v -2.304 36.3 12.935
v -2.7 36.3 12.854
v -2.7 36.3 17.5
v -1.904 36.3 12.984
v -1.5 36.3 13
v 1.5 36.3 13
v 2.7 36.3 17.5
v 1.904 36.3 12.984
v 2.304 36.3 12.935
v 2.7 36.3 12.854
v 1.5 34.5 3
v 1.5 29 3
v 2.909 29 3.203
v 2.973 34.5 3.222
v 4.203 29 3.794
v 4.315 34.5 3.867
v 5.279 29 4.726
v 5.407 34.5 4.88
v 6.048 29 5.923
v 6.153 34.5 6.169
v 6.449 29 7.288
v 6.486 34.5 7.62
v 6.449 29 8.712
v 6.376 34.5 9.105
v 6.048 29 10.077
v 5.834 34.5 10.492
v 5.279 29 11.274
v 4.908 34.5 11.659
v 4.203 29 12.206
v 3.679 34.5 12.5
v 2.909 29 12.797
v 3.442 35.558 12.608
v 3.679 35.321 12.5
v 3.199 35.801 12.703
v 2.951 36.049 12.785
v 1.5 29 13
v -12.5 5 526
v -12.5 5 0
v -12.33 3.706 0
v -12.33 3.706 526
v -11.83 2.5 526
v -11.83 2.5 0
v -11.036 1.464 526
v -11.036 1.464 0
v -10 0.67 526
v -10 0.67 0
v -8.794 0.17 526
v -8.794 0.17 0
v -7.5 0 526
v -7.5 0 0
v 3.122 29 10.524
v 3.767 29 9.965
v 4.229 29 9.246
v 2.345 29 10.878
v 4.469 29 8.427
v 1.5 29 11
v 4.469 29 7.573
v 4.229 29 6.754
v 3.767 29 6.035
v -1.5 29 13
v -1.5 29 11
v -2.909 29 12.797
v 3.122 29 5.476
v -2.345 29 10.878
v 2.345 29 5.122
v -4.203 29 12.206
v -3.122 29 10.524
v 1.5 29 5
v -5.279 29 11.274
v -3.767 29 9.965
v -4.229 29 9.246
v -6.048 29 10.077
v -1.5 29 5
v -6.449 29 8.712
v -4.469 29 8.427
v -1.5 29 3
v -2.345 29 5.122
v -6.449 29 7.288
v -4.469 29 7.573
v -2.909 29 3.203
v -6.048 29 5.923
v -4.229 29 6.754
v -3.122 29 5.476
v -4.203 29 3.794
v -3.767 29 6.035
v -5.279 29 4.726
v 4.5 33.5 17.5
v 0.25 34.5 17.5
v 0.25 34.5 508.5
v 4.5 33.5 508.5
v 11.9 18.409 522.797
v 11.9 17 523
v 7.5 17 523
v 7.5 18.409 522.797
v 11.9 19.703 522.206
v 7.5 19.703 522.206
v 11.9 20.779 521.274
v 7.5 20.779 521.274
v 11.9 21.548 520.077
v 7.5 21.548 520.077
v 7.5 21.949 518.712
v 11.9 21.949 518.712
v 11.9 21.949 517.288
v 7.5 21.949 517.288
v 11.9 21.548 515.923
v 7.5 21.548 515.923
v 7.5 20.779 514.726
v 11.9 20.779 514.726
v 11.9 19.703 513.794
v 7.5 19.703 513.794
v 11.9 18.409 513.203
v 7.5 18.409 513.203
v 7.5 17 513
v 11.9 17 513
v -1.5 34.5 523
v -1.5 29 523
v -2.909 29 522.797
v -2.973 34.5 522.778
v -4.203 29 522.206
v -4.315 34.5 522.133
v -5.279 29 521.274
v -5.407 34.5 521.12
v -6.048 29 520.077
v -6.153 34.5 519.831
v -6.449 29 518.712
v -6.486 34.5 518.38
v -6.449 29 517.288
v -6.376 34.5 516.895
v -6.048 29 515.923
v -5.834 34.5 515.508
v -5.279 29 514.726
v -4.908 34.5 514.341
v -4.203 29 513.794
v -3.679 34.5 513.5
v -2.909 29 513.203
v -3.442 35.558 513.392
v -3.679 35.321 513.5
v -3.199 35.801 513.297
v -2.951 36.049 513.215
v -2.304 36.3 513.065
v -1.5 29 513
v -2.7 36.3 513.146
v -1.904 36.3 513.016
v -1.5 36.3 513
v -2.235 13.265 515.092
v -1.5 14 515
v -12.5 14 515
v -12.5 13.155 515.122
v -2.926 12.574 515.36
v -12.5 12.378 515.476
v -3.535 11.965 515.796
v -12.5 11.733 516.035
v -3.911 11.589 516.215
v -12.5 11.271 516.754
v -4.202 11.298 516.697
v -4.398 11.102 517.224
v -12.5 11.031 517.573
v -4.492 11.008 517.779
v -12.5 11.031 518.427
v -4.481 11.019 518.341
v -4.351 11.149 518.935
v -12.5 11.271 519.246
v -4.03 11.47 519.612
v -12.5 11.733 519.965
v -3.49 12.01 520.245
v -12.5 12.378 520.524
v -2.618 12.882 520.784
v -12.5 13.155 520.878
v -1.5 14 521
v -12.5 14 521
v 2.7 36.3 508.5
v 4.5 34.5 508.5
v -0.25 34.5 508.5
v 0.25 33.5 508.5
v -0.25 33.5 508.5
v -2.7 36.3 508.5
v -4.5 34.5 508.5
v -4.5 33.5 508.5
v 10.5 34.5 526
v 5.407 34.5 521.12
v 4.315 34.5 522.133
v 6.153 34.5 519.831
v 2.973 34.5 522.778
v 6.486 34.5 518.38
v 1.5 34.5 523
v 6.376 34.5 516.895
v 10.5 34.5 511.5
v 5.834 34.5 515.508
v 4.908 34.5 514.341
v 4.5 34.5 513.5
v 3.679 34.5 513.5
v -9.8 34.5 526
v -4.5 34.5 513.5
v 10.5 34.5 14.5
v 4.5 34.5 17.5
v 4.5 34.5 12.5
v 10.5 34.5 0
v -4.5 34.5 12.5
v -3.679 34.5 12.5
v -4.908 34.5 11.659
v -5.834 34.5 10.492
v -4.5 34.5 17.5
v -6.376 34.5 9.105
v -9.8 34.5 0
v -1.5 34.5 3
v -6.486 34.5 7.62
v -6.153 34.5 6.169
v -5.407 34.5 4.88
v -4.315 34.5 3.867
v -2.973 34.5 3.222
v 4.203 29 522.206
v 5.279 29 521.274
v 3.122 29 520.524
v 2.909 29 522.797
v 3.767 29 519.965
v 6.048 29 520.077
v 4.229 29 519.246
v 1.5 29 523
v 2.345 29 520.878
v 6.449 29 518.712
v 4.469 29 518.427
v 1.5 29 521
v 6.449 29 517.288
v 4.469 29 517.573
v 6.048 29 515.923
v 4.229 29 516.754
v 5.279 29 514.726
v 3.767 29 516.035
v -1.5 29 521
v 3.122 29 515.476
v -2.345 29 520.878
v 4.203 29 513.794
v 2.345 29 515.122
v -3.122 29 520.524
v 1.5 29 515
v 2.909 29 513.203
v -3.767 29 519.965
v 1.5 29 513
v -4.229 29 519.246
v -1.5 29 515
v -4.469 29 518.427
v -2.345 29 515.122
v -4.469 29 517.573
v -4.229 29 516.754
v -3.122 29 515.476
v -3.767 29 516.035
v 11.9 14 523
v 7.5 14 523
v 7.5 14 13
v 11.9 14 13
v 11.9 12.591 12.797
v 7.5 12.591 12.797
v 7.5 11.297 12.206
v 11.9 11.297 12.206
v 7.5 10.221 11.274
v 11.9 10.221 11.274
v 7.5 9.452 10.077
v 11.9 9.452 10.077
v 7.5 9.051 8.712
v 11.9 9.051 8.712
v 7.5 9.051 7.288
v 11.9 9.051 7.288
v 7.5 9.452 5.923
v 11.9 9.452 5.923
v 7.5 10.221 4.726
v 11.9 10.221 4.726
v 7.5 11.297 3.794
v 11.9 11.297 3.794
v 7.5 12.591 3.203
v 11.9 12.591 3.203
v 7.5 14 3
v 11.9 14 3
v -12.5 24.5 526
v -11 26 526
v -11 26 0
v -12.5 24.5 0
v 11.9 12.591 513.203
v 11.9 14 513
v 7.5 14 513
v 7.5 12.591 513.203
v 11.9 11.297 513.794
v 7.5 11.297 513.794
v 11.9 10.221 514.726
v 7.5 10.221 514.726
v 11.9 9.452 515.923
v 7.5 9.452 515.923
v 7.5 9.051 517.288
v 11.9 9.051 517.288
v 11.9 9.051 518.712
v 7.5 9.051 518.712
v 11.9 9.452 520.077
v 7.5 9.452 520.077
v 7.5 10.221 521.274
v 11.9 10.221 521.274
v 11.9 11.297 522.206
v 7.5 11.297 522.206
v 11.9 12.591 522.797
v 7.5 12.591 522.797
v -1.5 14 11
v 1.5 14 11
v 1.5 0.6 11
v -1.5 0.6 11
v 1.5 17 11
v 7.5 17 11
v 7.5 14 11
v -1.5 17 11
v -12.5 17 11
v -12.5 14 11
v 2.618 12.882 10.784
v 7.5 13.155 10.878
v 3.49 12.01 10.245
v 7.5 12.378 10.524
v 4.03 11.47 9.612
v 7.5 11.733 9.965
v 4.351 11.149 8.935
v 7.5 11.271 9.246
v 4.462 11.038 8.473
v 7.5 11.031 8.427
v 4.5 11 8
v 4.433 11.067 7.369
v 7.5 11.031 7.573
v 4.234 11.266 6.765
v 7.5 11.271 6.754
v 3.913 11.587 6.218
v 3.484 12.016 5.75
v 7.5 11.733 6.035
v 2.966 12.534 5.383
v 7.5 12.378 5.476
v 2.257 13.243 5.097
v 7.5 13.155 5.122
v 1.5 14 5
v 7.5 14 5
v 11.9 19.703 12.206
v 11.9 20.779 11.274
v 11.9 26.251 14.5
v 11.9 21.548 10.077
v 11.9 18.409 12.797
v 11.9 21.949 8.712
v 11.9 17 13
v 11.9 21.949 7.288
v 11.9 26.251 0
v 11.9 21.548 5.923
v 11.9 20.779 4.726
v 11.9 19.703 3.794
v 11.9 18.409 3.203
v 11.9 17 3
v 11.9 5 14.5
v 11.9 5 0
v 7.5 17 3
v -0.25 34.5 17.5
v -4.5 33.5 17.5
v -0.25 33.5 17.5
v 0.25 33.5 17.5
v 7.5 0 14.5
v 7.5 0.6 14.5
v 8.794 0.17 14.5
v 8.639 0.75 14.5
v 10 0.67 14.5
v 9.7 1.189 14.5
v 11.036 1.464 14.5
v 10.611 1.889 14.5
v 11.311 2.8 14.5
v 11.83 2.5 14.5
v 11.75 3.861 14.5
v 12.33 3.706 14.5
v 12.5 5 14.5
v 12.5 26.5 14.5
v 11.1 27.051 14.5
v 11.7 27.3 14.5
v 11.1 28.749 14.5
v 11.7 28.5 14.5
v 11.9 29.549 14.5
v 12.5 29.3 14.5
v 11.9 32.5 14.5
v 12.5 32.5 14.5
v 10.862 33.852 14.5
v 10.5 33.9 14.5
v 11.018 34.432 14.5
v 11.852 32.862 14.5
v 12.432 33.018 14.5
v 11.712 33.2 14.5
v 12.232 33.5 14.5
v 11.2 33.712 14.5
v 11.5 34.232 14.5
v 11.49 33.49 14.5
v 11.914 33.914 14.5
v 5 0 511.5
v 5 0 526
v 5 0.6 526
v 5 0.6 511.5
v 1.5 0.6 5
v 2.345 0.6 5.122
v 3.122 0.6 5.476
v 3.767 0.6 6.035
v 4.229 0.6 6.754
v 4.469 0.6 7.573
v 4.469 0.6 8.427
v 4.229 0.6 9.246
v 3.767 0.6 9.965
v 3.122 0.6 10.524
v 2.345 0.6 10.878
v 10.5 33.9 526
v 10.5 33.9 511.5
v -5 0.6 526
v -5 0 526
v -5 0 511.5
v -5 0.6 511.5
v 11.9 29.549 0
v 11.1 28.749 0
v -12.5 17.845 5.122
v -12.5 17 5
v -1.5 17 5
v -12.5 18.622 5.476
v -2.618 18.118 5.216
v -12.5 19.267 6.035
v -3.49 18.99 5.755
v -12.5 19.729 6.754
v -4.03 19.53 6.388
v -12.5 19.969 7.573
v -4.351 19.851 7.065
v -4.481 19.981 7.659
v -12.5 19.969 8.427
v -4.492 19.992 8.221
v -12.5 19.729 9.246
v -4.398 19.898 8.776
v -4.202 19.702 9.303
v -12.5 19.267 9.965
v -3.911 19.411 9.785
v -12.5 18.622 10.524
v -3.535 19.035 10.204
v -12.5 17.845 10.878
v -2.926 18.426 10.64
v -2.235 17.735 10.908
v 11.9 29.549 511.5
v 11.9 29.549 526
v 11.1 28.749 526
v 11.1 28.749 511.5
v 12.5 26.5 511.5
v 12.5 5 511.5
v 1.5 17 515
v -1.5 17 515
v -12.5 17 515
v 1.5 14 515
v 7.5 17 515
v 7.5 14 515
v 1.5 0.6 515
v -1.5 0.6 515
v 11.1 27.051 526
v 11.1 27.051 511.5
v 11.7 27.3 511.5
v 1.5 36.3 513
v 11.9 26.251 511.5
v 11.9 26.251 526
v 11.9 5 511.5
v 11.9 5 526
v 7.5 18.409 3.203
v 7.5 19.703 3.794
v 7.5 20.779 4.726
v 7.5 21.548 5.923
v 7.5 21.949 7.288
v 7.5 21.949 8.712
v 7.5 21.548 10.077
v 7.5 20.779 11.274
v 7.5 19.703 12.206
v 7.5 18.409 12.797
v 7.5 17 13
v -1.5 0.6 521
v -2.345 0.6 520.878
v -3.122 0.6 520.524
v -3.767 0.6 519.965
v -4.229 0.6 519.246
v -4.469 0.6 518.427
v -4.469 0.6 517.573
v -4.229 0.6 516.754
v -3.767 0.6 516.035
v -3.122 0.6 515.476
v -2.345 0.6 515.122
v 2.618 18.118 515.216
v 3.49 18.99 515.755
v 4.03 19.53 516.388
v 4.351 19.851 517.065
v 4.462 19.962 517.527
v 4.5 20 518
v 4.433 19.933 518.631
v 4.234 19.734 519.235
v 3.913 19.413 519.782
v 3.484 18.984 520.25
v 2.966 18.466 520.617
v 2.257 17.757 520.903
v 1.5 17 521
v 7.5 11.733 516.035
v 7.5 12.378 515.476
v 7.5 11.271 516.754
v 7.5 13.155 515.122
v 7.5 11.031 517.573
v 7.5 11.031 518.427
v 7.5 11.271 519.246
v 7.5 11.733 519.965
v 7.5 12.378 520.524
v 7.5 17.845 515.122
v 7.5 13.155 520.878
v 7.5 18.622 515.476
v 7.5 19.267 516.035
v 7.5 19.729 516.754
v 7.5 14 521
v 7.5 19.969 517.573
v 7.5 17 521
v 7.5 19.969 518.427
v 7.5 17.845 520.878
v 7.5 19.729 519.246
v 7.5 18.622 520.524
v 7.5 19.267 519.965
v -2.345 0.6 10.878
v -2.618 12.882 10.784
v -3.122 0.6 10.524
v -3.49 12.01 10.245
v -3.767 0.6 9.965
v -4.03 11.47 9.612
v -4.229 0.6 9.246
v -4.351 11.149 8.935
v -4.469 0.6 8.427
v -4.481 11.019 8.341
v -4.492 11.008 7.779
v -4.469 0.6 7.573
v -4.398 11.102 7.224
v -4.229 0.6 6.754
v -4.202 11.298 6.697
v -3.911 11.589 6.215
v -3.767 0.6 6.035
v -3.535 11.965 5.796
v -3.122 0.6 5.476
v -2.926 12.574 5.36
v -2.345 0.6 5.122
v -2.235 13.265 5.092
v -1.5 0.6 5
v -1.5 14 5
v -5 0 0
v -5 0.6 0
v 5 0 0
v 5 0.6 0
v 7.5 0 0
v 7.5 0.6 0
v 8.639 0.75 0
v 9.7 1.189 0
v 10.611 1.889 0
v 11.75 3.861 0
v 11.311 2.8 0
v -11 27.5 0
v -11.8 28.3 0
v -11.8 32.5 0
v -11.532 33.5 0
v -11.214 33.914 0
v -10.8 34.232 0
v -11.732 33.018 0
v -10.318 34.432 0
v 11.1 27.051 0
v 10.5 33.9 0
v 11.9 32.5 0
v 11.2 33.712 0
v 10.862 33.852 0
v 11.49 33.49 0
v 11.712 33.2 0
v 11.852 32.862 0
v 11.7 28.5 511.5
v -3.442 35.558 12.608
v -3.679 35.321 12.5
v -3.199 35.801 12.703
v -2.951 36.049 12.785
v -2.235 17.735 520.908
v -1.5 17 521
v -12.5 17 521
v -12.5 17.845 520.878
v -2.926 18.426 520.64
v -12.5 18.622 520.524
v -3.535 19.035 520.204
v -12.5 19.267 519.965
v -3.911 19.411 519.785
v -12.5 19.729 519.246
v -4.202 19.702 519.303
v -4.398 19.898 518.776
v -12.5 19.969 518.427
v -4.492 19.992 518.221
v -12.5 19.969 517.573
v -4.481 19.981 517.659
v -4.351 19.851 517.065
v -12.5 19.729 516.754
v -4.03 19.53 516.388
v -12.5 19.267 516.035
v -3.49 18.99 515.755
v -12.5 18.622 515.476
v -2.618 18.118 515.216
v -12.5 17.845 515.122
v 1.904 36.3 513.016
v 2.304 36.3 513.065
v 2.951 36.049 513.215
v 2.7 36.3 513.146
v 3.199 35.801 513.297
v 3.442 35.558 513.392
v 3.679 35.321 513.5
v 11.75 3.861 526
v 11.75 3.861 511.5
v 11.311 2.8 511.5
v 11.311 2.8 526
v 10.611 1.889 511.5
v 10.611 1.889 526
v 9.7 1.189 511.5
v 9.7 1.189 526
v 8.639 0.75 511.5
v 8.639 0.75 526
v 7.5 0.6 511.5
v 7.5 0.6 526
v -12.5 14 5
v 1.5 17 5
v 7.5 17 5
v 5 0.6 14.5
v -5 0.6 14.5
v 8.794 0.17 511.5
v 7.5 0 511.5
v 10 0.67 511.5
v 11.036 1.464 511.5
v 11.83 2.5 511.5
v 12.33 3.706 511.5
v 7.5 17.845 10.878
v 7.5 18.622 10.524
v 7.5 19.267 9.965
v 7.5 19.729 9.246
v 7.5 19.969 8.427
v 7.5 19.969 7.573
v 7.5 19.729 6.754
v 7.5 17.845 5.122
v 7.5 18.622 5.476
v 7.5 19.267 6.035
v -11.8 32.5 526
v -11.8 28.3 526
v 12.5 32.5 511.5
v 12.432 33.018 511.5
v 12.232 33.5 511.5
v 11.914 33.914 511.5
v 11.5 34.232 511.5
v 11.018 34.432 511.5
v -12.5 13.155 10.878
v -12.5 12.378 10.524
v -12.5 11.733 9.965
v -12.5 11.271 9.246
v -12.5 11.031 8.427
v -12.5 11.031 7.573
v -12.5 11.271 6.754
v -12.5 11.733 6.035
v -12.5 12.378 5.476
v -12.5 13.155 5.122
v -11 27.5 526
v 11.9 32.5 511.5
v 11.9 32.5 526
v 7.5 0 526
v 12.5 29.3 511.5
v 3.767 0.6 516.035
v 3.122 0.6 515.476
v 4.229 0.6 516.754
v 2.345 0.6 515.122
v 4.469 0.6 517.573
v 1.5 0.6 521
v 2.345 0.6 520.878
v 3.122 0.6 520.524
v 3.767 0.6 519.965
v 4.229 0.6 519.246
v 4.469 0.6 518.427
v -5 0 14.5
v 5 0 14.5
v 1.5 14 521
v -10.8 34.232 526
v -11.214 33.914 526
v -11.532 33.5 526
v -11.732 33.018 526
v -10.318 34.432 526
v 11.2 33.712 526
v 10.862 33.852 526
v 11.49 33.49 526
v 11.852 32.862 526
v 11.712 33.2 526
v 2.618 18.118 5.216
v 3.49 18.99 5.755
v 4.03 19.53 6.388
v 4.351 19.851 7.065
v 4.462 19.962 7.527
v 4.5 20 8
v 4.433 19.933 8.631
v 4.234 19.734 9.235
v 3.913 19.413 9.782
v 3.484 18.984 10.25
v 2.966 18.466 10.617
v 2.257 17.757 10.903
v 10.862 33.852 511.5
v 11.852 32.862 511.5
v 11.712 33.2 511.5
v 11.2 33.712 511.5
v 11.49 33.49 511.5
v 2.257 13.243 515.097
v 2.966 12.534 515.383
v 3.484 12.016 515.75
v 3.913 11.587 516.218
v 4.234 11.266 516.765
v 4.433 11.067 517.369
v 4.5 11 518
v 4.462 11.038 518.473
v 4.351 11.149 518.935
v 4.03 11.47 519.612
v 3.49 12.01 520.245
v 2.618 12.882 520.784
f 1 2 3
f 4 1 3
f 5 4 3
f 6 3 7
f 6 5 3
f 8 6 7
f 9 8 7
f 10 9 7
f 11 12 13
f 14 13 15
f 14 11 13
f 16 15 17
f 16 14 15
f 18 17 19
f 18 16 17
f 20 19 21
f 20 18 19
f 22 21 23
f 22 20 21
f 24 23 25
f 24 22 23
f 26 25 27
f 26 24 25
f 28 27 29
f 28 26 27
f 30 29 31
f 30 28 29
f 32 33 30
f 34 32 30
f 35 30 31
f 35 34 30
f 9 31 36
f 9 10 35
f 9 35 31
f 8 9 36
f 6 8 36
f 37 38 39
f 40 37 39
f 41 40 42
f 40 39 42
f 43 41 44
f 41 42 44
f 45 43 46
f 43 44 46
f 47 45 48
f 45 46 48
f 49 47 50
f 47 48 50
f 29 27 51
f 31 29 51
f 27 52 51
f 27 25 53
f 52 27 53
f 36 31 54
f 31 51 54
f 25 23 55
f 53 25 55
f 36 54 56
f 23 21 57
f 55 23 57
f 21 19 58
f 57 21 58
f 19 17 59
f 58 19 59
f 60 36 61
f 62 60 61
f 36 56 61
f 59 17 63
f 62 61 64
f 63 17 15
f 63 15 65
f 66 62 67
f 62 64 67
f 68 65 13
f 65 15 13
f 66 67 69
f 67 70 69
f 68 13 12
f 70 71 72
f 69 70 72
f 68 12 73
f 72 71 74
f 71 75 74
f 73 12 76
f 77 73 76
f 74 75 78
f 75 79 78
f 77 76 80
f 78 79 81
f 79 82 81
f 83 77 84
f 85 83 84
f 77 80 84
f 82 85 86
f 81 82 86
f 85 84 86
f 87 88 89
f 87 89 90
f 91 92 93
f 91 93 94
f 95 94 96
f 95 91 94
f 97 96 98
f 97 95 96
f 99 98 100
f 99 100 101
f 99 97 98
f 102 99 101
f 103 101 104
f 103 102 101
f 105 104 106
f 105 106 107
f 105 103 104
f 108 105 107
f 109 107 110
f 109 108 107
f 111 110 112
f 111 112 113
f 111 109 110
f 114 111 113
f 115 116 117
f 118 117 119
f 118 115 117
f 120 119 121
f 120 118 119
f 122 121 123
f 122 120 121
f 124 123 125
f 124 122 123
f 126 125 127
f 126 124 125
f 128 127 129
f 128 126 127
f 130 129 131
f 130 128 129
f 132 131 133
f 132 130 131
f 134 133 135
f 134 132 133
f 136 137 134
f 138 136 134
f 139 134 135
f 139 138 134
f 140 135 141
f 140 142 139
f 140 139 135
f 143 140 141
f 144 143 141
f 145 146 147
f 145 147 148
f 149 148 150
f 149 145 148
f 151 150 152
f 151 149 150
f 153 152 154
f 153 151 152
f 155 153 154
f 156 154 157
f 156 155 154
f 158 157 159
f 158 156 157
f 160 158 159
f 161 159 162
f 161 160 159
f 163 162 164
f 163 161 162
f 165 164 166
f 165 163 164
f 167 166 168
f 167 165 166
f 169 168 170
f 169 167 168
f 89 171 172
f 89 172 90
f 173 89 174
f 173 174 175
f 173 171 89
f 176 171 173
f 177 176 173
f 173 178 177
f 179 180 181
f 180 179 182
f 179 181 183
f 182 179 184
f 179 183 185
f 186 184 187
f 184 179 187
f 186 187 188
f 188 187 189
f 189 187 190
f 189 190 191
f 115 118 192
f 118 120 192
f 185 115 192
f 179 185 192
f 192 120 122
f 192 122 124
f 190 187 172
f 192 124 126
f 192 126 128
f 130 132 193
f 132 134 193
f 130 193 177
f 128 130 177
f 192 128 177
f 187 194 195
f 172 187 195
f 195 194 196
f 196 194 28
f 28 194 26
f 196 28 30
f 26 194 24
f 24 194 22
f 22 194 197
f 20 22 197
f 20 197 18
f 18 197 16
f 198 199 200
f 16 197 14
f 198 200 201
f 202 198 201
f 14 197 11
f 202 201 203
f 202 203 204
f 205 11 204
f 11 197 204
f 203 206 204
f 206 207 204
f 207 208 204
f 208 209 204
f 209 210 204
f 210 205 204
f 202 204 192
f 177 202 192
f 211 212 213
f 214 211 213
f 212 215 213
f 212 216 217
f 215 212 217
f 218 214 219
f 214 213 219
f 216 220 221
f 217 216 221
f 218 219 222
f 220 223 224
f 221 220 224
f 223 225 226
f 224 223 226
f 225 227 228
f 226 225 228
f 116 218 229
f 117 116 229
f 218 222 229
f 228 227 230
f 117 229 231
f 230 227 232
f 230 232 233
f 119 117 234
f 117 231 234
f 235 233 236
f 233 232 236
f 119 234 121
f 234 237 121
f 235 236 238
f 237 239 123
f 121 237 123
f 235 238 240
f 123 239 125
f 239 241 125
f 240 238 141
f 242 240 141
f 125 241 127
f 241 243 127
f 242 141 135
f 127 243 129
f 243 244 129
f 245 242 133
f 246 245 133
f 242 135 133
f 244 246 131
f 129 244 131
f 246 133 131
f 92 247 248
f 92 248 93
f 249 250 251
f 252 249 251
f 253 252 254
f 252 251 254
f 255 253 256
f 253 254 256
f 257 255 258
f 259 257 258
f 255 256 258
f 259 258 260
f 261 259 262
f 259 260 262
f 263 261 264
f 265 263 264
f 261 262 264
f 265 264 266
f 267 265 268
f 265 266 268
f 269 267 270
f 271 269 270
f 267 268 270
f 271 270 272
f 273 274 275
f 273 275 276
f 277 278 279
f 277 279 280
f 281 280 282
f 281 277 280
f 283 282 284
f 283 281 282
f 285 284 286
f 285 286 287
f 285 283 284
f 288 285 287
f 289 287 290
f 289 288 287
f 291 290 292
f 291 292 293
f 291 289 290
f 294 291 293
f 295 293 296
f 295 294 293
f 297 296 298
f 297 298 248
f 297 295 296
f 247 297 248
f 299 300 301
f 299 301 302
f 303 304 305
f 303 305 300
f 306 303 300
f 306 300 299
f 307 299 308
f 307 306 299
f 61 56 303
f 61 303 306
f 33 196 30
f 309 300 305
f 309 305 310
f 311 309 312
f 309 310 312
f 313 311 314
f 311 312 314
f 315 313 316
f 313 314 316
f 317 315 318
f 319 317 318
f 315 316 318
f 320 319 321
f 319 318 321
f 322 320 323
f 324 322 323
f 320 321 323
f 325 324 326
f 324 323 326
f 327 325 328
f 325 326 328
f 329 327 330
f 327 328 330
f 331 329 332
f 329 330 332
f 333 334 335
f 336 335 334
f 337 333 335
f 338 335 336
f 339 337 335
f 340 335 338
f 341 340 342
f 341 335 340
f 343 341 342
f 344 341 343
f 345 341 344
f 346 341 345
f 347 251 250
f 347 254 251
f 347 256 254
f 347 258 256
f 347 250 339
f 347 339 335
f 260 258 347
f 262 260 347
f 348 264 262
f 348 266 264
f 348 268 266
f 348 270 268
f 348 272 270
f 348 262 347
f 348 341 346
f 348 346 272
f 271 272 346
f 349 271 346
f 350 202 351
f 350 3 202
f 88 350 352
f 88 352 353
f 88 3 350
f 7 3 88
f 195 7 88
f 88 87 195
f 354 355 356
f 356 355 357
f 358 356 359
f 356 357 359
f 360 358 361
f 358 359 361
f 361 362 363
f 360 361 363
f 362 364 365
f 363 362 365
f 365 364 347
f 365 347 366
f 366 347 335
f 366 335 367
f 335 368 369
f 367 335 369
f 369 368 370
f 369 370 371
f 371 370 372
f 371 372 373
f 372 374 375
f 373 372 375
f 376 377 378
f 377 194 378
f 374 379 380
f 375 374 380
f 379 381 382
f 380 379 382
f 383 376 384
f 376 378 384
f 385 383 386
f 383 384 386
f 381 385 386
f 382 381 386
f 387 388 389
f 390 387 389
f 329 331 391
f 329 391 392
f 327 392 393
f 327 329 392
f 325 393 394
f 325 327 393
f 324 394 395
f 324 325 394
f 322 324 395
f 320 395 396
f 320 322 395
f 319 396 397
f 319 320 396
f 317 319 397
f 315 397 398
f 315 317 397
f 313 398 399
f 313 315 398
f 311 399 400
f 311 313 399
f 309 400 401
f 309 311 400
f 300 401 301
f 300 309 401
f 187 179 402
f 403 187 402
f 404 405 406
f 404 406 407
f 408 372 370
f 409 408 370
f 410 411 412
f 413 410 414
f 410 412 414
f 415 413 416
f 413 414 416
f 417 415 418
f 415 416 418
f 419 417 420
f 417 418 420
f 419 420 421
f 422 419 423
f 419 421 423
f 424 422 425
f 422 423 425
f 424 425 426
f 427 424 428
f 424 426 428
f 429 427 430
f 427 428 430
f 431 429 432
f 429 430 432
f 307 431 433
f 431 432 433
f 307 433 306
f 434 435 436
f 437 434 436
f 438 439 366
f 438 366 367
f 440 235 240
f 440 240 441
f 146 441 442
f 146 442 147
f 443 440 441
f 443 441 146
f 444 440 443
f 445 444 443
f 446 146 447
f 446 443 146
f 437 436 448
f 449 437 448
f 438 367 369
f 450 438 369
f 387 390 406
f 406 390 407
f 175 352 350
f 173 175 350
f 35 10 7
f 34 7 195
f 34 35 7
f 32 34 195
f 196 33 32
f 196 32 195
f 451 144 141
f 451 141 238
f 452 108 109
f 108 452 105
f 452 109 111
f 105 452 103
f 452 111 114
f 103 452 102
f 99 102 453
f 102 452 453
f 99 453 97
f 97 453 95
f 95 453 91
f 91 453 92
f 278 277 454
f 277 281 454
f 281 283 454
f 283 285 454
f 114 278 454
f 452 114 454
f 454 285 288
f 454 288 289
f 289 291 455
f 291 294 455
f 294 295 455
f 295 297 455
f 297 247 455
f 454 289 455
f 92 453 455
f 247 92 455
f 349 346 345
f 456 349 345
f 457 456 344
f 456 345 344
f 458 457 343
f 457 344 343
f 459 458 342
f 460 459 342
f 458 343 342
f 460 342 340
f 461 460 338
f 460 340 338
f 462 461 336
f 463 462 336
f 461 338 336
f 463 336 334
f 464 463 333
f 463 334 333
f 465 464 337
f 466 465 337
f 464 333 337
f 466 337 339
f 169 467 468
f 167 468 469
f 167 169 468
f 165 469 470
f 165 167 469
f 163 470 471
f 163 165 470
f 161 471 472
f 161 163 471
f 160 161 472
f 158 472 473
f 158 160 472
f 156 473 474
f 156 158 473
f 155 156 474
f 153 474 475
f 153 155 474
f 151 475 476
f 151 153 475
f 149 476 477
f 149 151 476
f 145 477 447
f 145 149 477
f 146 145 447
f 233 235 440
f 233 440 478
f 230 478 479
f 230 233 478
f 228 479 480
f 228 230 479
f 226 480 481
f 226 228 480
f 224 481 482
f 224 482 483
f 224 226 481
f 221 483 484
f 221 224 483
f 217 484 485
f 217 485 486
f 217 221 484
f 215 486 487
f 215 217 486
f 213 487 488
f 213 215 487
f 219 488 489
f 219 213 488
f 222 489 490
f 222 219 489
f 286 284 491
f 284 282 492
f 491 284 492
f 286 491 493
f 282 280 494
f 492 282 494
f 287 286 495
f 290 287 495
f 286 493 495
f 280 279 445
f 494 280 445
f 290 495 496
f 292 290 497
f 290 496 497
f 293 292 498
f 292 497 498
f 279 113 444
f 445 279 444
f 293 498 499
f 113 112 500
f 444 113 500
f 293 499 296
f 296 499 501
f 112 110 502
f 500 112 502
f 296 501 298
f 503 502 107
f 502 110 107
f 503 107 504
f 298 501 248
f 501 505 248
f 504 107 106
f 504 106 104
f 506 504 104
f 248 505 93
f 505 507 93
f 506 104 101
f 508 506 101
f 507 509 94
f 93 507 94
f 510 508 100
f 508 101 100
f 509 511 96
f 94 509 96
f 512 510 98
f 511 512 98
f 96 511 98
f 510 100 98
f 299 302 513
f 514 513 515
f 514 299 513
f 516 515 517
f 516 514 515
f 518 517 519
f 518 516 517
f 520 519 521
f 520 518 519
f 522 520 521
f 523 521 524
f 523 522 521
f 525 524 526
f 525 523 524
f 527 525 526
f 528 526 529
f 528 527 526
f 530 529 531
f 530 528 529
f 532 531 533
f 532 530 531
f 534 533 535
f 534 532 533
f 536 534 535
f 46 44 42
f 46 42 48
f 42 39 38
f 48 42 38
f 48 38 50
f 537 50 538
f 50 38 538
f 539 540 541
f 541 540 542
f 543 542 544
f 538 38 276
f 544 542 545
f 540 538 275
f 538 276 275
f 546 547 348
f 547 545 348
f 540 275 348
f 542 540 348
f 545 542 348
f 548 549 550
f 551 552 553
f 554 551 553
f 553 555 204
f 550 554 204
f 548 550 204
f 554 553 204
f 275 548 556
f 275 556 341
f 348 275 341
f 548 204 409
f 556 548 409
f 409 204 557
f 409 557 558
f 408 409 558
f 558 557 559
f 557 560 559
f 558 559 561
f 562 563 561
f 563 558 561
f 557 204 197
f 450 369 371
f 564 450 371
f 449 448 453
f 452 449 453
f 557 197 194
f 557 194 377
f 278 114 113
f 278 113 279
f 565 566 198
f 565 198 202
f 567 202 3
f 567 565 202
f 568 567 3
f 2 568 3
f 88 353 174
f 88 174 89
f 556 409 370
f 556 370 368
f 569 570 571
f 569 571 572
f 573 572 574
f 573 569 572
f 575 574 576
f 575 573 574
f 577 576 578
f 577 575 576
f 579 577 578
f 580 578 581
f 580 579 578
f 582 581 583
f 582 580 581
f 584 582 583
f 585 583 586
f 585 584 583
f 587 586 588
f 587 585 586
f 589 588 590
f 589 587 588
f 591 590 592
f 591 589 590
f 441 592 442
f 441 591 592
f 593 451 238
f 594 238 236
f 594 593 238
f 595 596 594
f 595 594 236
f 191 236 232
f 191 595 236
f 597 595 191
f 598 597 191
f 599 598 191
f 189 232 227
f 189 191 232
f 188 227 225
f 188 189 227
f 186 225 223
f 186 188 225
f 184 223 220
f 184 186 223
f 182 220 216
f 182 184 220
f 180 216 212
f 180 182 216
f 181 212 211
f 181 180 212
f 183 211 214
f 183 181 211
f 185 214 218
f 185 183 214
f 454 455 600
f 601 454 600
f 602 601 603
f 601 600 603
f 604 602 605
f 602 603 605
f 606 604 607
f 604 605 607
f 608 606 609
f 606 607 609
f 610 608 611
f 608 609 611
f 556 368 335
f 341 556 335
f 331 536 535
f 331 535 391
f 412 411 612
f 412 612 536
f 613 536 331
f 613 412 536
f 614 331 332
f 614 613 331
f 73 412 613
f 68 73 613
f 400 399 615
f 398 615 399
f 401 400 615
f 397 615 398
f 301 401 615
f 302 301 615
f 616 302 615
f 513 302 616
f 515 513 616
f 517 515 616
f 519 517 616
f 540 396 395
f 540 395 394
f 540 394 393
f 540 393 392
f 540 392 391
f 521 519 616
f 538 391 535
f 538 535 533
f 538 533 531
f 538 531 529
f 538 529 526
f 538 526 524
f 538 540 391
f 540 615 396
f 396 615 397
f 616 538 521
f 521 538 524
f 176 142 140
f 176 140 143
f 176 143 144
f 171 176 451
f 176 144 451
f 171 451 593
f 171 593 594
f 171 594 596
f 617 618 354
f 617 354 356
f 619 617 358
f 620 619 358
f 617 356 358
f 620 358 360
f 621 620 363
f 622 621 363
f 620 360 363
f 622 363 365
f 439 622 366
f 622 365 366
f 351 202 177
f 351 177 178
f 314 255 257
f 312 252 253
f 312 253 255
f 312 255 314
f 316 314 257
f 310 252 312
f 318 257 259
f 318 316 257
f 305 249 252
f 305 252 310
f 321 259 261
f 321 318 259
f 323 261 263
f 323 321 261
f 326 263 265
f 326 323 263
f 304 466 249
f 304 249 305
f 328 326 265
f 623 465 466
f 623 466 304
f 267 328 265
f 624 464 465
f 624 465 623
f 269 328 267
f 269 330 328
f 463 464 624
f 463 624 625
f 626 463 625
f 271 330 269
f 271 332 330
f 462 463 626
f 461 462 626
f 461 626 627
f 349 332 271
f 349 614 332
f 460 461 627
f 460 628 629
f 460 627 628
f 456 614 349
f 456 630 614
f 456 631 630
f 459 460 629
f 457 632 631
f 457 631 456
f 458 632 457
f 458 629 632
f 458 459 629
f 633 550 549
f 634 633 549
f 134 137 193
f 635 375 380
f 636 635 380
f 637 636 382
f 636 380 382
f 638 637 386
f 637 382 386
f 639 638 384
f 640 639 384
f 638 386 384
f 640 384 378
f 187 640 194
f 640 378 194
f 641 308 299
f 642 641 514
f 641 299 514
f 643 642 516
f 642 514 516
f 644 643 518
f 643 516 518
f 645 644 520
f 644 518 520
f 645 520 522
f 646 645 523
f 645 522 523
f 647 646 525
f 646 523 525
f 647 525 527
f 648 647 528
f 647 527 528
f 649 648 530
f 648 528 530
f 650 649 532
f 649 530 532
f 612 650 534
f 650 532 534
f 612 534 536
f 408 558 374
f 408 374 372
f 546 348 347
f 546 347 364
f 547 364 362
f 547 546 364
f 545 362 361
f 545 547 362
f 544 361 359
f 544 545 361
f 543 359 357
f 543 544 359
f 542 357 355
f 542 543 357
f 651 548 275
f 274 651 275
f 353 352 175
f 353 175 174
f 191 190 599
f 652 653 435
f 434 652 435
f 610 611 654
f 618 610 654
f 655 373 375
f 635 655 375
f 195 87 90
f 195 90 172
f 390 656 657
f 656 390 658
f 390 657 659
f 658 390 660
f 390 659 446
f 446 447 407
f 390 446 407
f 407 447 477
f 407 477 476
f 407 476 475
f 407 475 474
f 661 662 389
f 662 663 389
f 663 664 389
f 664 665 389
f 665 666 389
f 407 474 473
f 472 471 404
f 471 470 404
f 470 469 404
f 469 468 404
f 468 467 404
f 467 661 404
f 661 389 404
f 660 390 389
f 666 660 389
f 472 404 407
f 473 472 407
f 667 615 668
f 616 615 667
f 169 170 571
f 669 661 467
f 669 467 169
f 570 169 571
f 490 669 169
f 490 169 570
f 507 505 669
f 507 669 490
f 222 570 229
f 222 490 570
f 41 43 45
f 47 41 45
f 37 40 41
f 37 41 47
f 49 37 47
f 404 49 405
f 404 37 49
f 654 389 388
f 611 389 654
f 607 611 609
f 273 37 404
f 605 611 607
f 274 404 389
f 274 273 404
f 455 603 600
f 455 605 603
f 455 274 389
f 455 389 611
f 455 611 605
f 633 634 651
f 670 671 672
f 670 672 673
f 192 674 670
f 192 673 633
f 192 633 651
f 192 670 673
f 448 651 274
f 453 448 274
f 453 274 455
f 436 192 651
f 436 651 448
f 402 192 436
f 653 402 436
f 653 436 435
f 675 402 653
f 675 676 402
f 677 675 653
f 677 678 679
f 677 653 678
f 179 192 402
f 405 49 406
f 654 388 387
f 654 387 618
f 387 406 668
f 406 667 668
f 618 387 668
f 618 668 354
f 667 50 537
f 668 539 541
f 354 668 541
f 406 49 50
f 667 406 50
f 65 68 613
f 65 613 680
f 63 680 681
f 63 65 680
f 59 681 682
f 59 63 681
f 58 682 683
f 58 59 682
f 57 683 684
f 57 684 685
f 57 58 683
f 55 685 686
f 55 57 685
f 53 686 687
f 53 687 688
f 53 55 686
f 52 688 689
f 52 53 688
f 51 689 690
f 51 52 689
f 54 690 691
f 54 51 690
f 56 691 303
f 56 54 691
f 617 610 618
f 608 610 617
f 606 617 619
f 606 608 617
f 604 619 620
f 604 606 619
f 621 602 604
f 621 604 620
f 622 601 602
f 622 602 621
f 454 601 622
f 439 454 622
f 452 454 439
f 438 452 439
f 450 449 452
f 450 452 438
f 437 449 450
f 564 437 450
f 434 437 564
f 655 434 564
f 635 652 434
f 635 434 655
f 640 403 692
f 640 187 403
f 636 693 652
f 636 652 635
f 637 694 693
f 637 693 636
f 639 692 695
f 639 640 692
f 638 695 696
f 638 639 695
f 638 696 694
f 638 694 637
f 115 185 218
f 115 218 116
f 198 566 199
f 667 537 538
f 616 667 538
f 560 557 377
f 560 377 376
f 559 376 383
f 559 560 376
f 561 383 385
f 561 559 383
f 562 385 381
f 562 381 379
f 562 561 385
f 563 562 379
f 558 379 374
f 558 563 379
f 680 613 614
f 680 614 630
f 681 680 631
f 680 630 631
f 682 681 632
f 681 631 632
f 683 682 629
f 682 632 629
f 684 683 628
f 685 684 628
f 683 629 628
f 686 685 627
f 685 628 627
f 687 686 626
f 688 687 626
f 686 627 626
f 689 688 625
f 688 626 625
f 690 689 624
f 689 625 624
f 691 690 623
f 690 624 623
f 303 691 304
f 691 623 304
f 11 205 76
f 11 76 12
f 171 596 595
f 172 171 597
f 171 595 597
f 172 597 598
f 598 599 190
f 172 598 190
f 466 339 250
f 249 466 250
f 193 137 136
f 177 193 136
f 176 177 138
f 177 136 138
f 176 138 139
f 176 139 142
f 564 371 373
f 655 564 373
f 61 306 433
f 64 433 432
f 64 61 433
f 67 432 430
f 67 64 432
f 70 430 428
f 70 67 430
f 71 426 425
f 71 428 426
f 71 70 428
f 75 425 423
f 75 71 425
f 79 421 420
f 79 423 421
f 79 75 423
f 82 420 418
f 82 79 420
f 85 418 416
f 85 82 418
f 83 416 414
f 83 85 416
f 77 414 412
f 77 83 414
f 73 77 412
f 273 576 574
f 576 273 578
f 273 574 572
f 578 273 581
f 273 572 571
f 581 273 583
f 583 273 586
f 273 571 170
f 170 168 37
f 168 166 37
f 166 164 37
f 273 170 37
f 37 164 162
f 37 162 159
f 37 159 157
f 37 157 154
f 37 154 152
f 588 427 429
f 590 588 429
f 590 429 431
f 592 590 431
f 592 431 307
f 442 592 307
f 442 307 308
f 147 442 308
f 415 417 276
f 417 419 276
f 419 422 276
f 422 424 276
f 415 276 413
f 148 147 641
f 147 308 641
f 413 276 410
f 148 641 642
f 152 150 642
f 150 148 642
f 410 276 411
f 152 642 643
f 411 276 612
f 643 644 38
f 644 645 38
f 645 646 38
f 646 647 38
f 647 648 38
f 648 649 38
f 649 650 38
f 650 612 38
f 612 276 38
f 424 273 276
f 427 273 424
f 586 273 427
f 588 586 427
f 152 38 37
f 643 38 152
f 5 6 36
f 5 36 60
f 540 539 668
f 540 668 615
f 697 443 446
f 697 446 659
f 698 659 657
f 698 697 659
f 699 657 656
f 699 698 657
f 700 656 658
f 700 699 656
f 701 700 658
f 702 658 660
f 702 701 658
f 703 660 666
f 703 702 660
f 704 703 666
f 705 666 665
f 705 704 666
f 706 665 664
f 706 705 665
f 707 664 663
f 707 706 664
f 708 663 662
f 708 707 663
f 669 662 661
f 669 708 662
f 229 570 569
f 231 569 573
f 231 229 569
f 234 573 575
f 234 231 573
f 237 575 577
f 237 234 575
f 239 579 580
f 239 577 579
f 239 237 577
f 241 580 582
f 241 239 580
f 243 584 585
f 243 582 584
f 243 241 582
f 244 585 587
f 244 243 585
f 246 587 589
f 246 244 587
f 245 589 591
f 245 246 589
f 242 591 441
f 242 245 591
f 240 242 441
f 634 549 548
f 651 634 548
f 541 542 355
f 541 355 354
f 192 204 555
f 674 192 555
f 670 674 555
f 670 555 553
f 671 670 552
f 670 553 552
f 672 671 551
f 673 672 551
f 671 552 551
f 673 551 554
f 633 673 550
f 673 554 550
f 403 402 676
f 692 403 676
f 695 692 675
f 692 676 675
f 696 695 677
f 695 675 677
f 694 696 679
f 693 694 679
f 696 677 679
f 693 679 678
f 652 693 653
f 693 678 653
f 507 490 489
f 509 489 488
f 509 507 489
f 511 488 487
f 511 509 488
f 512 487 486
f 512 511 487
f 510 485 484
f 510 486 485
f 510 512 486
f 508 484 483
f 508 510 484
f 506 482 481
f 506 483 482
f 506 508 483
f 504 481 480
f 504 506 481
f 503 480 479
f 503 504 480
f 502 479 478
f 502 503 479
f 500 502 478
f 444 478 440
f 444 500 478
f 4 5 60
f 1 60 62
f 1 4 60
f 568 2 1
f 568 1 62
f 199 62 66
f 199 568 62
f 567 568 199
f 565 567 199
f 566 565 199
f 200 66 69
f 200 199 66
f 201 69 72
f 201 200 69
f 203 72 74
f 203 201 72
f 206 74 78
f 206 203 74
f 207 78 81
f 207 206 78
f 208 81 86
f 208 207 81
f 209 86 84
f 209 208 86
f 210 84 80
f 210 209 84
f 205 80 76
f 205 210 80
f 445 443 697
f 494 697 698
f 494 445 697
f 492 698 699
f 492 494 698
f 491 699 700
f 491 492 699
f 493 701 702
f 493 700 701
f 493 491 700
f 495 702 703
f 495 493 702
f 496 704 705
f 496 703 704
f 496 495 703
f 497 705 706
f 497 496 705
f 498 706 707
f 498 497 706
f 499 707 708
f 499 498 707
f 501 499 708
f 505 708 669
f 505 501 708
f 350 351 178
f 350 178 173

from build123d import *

# Parameters (mm, degrees)
EXTRUDE_1_DEPTH          = 526
SKETCH_2_W               = 10
SKETCH_2_H               = 0.6
CUT_EXTRUDE_1_DEPTH      = 14.5
EXTRUDE_START            = -12.5
EXTRUDE_2_DEPTH          = 5
CUT_EXTRUDE_2_DEPTH      = 4.4
CUT_EXTRUDE_3_DEPTH      = 26
CUT_EXTRUDE_4_DEPTH      = 5.5
CUT_EXTRUDE_4_DEPTH_BACK = 5.5
CUT_EXTRUDE_5_DEPTH      = 35.5
SKETCH_8_W               = 0.5
SKETCH_8_H               = 1
CUT_EXTRUDE_8_DEPTH      = 491


with BuildPart() as part:
    # Эскиз1 → Бобышка-Вытянуть1 (new body)
    with BuildSketch(Plane.XY):
        with BuildLine():
            Line((-11.8, 32.5), (-11.8, 28.3))
            Line((-11.8, 28.3), (-11, 27.5))
            Line((-11, 27.5), (-11, 26))
            Line((-11, 26), (-12.5, 24.5))
            Line((-12.5, 24.5), (-12.5, 5))
            ThreePointArc((-12.5, 5), (-11.035533906, 1.464466094), (-7.5, 0))
            Line((-7.5, 0), (7.5, 0))
            ThreePointArc((7.5, 0), (11.035533906, 1.464466094), (12.5, 5))
            Line((12.5, 5), (12.5, 26.5))
            Line((12.5, 26.5), (11.7, 27.3))
            Line((11.7, 27.3), (11.7, 28.5))
            Line((11.7, 28.5), (12.5, 29.3))
            Line((12.5, 29.3), (12.5, 32.5))
            ThreePointArc((12.5, 32.5), (11.914213562, 33.914213562), (10.5, 34.5))
            Line((10.5, 34.5), (-9.8, 34.5))
            ThreePointArc((-9.8, 34.5), (-11.214213562, 33.914213562), (-11.8, 32.5))
        make_face()
    extrude(amount=EXTRUDE_1_DEPTH)

    # Эскиз2 → Вырез-Вытянуть1 (cut)
    with BuildSketch(Plane(origin=(0, 0, 0), x_dir=(-1, 0, 0), z_dir=(0, 0, -1))):
        with BuildLine():
            ThreePointArc((-10.5, 33.9), (-11.489949494, 33.489949494), (-11.9, 32.5))
            Line((-11.9, 32.5), (-11.9, 29.548528137))
            Line((-11.9, 29.548528137), (-11.1, 28.748528137))
            Line((-11.1, 28.748528137), (-11.1, 27.051471863))
            Line((-11.1, 27.051471863), (-11.9, 26.251471863))
            Line((-11.9, 26.251471863), (-11.9, 5))
            ThreePointArc((-11.9, 5), (-10.611269837, 1.888730163), (-7.5, 0.6))
            Line((-7.5, 0.6), (-7.5, 0))
            ThreePointArc((-7.5, 0), (-11.035533906, 1.464466094), (-12.5, 5))
            Line((-12.5, 5), (-12.5, 26.5))
            Line((-12.5, 26.5), (-11.7, 27.3))
            Line((-11.7, 27.3), (-11.7, 28.5))
            Line((-11.7, 28.5), (-12.5, 29.3))
            Line((-12.5, 29.3), (-12.5, 32.5))
            ThreePointArc((-12.5, 32.5), (-11.914213562, 33.914213562), (-10.5, 34.5))
            Line((-10.5, 34.5), (-10.5, 33.9))
        make_face()
        with Locations((0, 0.3)):
            Rectangle(SKETCH_2_W, SKETCH_2_H)
    cut_extrude_1 = extrude(amount=-CUT_EXTRUDE_1_DEPTH, mode=Mode.SUBTRACT)

    # Эскиз5 → Бобышка-Вытянуть2 (add)
    with BuildSketch(Plane.XY.offset(526).offset(EXTRUDE_START)):
        Polygon((-4.5, 34.5), (-2.7, 36.3), (2.7, 36.3), (4.5, 34.5), align=None)
    extrude_2 = extrude(amount=-EXTRUDE_2_DEPTH)

    # Зеркальное отражение1: Вырез-Вытянуть1, Бобышка-Вытянуть2 across plane
    add(cut_extrude_1.mirror(Plane.XY.offset(263)), mode=Mode.SUBTRACT)
    add(extrude_2.mirror(Plane.XY.offset(263)))

    # Эскиз3 → Вырез-Вытянуть2 (cut)
    with BuildSketch(Plane(origin=(11.9, 0, 0), x_dir=(0, 0, -1), z_dir=(1, 0, 0))):
        with BuildLine():
            Line((-523, 14), (-523, 17))
            ThreePointArc((-523, 17), (-518, 22), (-513, 17))
            Line((-513, 17), (-513, 14))
            ThreePointArc((-513, 14), (-518, 9), (-523, 14))
        make_face()
        with BuildLine():
            Line((-3, 14), (-3, 17))
            ThreePointArc((-3, 17), (-8, 22), (-13, 17))
            Line((-13, 17), (-13, 14))
            ThreePointArc((-13, 14), (-8, 9), (-3, 14))
        make_face()
    extrude(amount=-CUT_EXTRUDE_2_DEPTH, mode=Mode.SUBTRACT)

    # Эскиз4 → Вырез-Вытянуть3 (cut, through all)
    with BuildSketch(Plane(origin=(12.5, 0, 0), x_dir=(0, 0, -1), z_dir=(1, 0, 0))):
        with BuildLine():
            Line((-521, 14), (-521, 17))
            ThreePointArc((-521, 17), (-518, 20), (-515, 17))
            Line((-515, 17), (-515, 14))
            ThreePointArc((-515, 14), (-518, 11), (-521, 14))
        make_face()
        with BuildLine():
            Line((-5, 14), (-5, 17))
            ThreePointArc((-5, 17), (-8, 20), (-11, 17))
            Line((-11, 17), (-11, 14))
            ThreePointArc((-11, 14), (-8, 11), (-5, 14))
        make_face()
    extrude(amount=-CUT_EXTRUDE_3_DEPTH, mode=Mode.SUBTRACT)

    # Эскиз6 → Вырез-Вытянуть4 (cut, two sides)
    with BuildSketch(Plane(origin=(0, 34.5, 0), x_dir=(1, 0, 0), z_dir=(0, 1, 0))) as cut_extrude_4_sk:
        with BuildLine():
            Line((-1.5, -3), (1.5, -3))
            ThreePointArc((1.5, -3), (6.5, -8), (1.5, -13))
            Line((1.5, -13), (-1.5, -13))
            ThreePointArc((-1.5, -13), (-6.5, -8), (-1.5, -3))
        make_face()
        with BuildLine():
            Line((-1.5, -513), (1.5, -513))
            ThreePointArc((1.5, -513), (6.5, -518), (1.5, -523))
            Line((1.5, -523), (-1.5, -523))
            ThreePointArc((-1.5, -523), (-6.5, -518), (-1.5, -513))
        make_face()
    extrude(amount=CUT_EXTRUDE_4_DEPTH, mode=Mode.SUBTRACT)
    extrude(cut_extrude_4_sk.sketch, amount=-CUT_EXTRUDE_4_DEPTH_BACK, mode=Mode.SUBTRACT)

    # Эскиз7 → Вырез-Вытянуть5 (cut, through all)
    with BuildSketch(Plane(origin=(0, 34.5, 0), x_dir=(1, 0, 0), z_dir=(0, 1, 0))):
        with BuildLine():
            Line((-1.5, -515), (1.5, -515))
            ThreePointArc((1.5, -515), (4.5, -518), (1.5, -521))
            Line((1.5, -521), (-1.5, -521))
            ThreePointArc((-1.5, -521), (-4.5, -518), (-1.5, -515))
        make_face()
        with BuildLine():
            Line((-1.5, -5), (1.5, -5))
            ThreePointArc((1.5, -5), (4.5, -8), (1.5, -11))
            Line((1.5, -11), (-1.5, -11))
            ThreePointArc((-1.5, -11), (-4.5, -8), (-1.5, -5))
        make_face()
    extrude(amount=-CUT_EXTRUDE_5_DEPTH, mode=Mode.SUBTRACT)

    # Эскиз8 → Вырез-Вытянуть8 (cut)
    with BuildSketch(Plane.XY.offset(17.5)):
        Polygon((-0.25, 34.5), (-4.5, 34.5), (-4.5, 33.5), align=None)
        with Locations((0, 34)):
            Rectangle(SKETCH_8_W, SKETCH_8_H)
        Polygon((4.5, 34.5), (0.25, 34.5), (4.5, 33.5), align=None)
    extrude(amount=CUT_EXTRUDE_8_DEPTH, mode=Mode.SUBTRACT)


solid = part.part
